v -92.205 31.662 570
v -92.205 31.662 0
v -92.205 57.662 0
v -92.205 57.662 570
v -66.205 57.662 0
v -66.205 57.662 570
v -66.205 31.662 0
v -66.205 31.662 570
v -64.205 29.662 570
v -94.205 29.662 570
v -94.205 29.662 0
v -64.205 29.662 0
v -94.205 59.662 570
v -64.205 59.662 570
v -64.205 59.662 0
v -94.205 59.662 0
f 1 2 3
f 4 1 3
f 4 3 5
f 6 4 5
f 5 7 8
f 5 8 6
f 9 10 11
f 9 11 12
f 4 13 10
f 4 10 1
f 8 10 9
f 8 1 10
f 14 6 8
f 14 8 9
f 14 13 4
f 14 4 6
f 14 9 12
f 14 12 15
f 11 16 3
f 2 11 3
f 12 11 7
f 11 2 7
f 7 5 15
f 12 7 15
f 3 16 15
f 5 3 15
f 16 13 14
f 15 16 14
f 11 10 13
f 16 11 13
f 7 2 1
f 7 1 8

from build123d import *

# Parameters (mm, degrees)
ESBO_O2_W                = 30
ESBO_O2_H                = 30
RESSALTO_EXTRUS_O1_DEPTH = 570
CASCA2_T                 = -2


with BuildPart() as part:
    # Esboço2 → Ressalto-extrusão1 (new body)
    with BuildSketch(Plane.XY):
        with Locations((-79.205213928, 44.662246879)):
            Rectangle(ESBO_O2_W, ESBO_O2_H)
    extrude(amount=RESSALTO_EXTRUS_O1_DEPTH)

    # Casca2
    casca2_openings = [part.faces().sort_by_distance(p)[0] for p in [
        (-79.205213928, 44.662246879, 570),
        (-79.205213928, 44.662246879, 0),
    ]]
    offset(amount=CASCA2_T, openings=casca2_openings, kind=Kind.INTERSECTION)


solid = part.part
